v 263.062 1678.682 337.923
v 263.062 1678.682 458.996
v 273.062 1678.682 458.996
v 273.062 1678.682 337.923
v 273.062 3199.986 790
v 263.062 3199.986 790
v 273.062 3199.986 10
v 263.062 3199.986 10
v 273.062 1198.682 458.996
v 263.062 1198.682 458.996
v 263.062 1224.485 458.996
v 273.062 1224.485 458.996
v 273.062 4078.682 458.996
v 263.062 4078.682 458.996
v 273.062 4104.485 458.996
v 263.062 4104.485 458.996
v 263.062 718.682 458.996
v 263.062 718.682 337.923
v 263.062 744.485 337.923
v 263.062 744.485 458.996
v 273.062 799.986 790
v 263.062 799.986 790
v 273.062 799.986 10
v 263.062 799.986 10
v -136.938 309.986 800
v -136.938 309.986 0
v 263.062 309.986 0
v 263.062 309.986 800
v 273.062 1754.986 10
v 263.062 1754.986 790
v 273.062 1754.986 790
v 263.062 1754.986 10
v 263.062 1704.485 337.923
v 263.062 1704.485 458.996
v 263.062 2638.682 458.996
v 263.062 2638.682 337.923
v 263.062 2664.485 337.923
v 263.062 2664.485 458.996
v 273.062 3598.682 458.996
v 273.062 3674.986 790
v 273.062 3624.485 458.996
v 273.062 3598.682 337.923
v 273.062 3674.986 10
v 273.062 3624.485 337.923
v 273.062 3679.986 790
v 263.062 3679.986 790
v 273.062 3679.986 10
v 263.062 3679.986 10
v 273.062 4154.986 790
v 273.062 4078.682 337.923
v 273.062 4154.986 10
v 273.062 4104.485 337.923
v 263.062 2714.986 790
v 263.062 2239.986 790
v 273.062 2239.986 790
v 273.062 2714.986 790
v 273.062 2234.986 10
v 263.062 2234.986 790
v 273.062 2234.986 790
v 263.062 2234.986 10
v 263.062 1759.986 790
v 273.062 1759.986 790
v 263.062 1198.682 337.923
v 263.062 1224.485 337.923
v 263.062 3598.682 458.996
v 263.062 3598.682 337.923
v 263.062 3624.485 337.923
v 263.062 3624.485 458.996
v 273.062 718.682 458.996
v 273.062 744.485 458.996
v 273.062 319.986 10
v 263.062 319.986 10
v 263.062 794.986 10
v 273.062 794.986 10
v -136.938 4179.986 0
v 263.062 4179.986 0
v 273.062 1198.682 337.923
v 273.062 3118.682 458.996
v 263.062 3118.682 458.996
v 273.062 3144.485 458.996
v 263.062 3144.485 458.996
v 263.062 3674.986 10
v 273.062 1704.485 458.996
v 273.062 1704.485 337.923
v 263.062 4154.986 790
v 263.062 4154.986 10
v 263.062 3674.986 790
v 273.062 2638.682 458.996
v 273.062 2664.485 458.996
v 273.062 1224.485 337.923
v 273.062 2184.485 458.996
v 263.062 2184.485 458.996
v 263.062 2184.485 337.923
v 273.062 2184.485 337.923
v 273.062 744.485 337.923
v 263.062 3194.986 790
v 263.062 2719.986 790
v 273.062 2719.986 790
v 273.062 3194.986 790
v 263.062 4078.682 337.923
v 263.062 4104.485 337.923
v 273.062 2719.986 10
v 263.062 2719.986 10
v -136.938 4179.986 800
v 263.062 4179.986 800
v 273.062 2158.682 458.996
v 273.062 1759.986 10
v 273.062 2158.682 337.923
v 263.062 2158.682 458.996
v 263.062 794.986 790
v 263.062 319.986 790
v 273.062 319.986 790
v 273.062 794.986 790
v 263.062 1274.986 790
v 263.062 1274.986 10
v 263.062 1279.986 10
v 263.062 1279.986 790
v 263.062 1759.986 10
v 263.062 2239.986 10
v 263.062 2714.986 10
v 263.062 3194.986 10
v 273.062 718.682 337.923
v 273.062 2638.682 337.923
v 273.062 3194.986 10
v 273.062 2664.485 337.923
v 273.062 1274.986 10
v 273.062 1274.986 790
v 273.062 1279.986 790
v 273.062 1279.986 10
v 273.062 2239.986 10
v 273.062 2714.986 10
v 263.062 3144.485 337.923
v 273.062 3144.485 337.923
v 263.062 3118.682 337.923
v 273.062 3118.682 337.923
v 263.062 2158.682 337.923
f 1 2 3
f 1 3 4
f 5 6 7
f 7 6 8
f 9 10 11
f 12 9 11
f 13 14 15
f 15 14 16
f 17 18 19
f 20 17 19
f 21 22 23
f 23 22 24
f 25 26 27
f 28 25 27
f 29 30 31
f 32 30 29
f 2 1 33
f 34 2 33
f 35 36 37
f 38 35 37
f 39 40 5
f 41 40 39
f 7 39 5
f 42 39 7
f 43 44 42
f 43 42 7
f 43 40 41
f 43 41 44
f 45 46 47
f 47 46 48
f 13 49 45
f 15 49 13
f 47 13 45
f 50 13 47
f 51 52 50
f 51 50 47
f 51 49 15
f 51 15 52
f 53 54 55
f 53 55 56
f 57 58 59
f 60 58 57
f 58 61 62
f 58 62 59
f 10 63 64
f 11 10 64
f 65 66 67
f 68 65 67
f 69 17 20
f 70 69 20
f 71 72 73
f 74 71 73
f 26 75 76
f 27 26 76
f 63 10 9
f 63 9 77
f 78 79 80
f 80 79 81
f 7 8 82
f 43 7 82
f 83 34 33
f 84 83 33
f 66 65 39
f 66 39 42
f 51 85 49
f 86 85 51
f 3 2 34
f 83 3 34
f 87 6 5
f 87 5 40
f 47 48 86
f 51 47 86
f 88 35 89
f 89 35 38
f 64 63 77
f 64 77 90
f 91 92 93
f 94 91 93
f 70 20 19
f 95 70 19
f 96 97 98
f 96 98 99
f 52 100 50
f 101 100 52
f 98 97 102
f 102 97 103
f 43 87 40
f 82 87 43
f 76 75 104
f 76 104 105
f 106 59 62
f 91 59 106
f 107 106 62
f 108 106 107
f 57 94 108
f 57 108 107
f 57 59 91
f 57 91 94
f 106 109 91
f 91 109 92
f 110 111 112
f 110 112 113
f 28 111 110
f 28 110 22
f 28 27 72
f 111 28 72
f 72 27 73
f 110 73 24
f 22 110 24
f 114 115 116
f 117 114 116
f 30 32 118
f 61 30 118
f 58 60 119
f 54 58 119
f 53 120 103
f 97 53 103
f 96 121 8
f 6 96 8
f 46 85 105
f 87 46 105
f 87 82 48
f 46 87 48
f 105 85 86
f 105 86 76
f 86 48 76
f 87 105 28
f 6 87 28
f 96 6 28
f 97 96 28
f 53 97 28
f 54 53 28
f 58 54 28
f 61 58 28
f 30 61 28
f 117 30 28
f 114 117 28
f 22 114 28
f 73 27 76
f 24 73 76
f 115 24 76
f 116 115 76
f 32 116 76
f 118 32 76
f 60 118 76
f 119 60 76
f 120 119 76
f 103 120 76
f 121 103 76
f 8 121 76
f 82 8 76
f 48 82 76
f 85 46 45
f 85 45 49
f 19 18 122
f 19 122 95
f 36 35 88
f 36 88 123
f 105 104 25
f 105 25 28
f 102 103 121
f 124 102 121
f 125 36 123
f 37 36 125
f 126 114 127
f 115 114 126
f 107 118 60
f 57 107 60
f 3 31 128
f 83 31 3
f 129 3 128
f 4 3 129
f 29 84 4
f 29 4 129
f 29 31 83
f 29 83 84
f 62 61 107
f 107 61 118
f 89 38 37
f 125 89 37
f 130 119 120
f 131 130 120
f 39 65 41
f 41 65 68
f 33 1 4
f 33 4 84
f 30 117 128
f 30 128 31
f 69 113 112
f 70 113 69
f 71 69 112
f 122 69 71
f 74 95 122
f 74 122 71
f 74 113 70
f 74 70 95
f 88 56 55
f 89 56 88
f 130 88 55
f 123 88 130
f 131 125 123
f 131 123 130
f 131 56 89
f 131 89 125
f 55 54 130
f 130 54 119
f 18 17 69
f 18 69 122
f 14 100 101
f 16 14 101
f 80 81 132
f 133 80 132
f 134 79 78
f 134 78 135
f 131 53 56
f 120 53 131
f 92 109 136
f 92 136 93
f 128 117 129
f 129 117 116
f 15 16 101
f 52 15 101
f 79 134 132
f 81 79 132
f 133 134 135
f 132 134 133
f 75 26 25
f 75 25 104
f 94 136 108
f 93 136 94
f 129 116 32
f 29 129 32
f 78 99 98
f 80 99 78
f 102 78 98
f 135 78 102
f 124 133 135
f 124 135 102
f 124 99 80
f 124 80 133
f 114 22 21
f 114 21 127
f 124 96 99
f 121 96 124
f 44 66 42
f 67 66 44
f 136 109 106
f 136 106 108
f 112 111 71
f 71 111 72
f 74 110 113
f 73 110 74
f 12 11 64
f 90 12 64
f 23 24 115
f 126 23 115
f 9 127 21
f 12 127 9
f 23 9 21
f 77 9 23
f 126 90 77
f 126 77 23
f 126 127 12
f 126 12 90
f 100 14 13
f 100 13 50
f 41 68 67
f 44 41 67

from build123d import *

# Parameters (mm, degrees)
SKETCH1_W           = 400
SKETCH1_H           = 3870
BOSS_EXTRUDE1_DEPTH = 800
SKETCH3_W           = 780
SKETCH3_H           = 475
SKETCH3_W_2         = 121.072841775
SKETCH3_H_2         = 25.802408903
BOSS_EXTRUDE3_DEPTH = 10


with BuildPart() as part:
    # Sketch1 → Boss-Extrude1 (new body)
    with BuildSketch(Plane.XY):
        with Locations((63.061970043, 2244.986327315)):
            Rectangle(SKETCH1_W, SKETCH1_H)
    extrude(amount=BOSS_EXTRUDE1_DEPTH)

    # Sketch3 → Boss-Extrude3 (add)
    with BuildSketch(Plane(origin=(263.061970043, 0, 0), x_dir=(0, 0, -1), z_dir=(1, 0, 0))):
        with Locations((-400, 557.486327315)):
            Rectangle(SKETCH3_W, SKETCH3_H)
        with Locations((-398.45909699, 731.583605055)):
            Rectangle(SKETCH3_W_2, SKETCH3_H_2, mode=Mode.SUBTRACT)
        with Locations((-400, 1037.486327315)):
            Rectangle(SKETCH3_W, SKETCH3_H)
        with Locations((-398.45909699, 1211.583605055)):
            Rectangle(SKETCH3_W_2, SKETCH3_H_2, mode=Mode.SUBTRACT)
        with Locations((-400, 1517.486327315)):
            Rectangle(SKETCH3_W, SKETCH3_H)
        with Locations((-398.45909699, 1691.583605055)):
            Rectangle(SKETCH3_W_2, SKETCH3_H_2, mode=Mode.SUBTRACT)
        with Locations((-400, 1997.486327315)):
            Rectangle(SKETCH3_W, SKETCH3_H)
        with Locations((-398.45909699, 2171.583605055)):
            Rectangle(SKETCH3_W_2, SKETCH3_H_2, mode=Mode.SUBTRACT)
        with Locations((-400, 2477.486327315)):
            Rectangle(SKETCH3_W, SKETCH3_H)
        with Locations((-398.45909699, 2651.583605055)):
            Rectangle(SKETCH3_W_2, SKETCH3_H_2, mode=Mode.SUBTRACT)
        with Locations((-400, 2957.486327315)):
            Rectangle(SKETCH3_W, SKETCH3_H)
        with Locations((-398.45909699, 3131.583605055)):
            Rectangle(SKETCH3_W_2, SKETCH3_H_2, mode=Mode.SUBTRACT)
        with Locations((-400, 3437.486327315)):
            Rectangle(SKETCH3_W, SKETCH3_H)
        with Locations((-398.45909699, 3611.583605055)):
            Rectangle(SKETCH3_W_2, SKETCH3_H_2, mode=Mode.SUBTRACT)
        with Locations((-400, 3917.486327315)):
            Rectangle(SKETCH3_W, SKETCH3_H)
        with Locations((-398.45909699, 4091.583605055)):
            Rectangle(SKETCH3_W_2, SKETCH3_H_2, mode=Mode.SUBTRACT)
    extrude(amount=BOSS_EXTRUDE3_DEPTH)


solid = part.part
